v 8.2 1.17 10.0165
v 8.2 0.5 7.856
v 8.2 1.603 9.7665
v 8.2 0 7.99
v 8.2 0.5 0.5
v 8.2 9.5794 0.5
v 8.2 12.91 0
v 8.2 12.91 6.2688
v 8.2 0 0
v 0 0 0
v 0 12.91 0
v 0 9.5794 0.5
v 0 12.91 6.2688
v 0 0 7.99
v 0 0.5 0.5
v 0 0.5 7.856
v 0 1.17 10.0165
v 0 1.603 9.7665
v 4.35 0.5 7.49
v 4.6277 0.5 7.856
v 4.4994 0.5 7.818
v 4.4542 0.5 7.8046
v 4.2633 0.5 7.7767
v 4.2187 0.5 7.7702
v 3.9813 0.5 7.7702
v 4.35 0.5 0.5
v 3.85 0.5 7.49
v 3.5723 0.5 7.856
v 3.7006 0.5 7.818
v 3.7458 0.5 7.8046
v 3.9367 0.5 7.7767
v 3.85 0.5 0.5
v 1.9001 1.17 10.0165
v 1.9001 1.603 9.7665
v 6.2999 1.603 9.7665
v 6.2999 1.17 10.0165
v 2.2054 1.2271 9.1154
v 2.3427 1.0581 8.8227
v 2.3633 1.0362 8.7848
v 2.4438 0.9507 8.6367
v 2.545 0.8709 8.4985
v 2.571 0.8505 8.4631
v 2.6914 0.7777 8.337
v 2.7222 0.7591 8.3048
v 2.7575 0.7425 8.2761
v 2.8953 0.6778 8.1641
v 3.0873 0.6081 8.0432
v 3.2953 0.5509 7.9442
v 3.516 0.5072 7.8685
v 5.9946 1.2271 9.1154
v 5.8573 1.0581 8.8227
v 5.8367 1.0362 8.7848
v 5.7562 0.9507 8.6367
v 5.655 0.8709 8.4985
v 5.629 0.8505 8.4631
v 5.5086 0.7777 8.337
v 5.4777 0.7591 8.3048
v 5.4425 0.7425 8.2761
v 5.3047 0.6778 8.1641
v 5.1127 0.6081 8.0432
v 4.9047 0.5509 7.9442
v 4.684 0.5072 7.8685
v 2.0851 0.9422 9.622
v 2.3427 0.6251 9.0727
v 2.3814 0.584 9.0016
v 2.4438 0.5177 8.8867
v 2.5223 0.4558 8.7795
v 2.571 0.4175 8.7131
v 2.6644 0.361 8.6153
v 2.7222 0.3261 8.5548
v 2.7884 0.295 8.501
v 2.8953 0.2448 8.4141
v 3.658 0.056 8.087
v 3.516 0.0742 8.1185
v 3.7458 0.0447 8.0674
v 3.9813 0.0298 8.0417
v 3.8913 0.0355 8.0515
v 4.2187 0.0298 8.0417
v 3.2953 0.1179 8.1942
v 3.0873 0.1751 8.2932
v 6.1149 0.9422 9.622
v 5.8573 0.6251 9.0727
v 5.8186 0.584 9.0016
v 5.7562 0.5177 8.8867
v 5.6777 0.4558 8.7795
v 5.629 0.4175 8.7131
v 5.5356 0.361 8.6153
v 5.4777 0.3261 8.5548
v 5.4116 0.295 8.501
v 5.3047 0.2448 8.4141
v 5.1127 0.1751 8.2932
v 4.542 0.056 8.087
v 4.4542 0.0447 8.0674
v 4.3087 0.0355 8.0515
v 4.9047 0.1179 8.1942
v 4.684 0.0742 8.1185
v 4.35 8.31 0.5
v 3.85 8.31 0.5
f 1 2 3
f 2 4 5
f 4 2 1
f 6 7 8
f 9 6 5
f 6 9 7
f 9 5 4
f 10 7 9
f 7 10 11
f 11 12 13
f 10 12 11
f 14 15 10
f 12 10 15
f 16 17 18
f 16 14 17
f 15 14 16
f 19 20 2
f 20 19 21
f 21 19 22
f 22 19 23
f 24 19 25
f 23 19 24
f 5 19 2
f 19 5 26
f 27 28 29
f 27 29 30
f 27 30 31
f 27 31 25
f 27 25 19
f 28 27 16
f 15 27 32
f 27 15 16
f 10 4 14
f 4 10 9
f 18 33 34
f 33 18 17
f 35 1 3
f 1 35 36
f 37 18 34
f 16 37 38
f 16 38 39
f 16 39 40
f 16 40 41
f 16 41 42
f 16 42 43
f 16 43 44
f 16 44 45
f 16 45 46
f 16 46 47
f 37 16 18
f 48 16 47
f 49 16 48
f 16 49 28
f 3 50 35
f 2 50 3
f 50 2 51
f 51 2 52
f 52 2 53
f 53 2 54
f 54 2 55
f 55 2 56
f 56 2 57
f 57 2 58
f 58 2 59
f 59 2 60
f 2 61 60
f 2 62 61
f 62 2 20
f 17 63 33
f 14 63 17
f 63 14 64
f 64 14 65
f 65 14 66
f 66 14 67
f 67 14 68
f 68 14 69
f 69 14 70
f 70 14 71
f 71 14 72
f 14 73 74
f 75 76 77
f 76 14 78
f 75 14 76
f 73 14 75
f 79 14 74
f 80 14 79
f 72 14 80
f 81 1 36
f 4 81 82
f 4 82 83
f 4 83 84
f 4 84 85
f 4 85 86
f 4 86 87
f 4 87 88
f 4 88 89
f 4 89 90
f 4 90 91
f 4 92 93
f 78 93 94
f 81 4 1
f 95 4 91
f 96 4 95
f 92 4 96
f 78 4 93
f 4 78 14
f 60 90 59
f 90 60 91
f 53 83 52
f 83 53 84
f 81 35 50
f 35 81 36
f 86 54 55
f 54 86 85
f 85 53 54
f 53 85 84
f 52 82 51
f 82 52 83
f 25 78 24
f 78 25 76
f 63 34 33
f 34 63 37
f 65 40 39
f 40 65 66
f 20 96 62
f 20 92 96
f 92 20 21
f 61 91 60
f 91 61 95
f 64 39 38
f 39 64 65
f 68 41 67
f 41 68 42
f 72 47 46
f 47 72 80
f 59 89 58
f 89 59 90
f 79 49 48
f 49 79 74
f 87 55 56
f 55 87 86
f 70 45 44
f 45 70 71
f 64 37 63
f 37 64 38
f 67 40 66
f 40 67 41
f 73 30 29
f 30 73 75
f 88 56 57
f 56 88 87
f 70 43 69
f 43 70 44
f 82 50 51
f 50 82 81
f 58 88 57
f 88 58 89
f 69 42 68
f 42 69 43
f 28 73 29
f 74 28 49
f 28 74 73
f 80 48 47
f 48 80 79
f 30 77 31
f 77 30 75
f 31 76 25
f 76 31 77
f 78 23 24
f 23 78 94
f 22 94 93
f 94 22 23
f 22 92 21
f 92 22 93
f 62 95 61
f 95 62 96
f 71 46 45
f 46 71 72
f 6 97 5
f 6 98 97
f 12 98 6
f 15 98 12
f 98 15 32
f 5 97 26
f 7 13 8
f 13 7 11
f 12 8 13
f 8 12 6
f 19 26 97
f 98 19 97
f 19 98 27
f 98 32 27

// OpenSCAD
$fn = 50;

union() {
    cube([8.2, 12.91, 0.5]);
    difference() {
        union() {
            cube([8.2, 0.5, 7.99]);
            translate([0, 0, 7.99]) {
                rotate([-30, 0, 0]) {
                    cube([8.2, 0.5, 2.34]);
                };
            };
        };
        hull() {
            translate([4.1, 1.9, 9.14]) {
                rotate([60, 0, 0]) {
                    cylinder(h=2.8, r2=1.89, r1=1.89);
                };
            };
            translate([4.1, 2.8, 10.94]) {
                rotate([60, 0, 0]) {
                    cylinder(h=2.8, r2=2.646, r1=2.646);
                };
            };
        };
    };
    difference() {
        translate([0, 8.81, 0.5]) {
            cube([8.2, 4.1, 6.56]);
        };
        translate([-0.25, 5.74, 2.05]) {
            rotate([-30, 0, 0]) {
                cube([8.7, 4.1, 9.84]);
            };
        };
    };
    translate([4.35, 0, 0]) {
        rotate([0, -90, 0]) {
            linear_extrude(height=0.5) {
                polygon([[0.5, 0.5], [7.49, 0.5], [0.5, 8.31]]);
            };
        };
    };
};
